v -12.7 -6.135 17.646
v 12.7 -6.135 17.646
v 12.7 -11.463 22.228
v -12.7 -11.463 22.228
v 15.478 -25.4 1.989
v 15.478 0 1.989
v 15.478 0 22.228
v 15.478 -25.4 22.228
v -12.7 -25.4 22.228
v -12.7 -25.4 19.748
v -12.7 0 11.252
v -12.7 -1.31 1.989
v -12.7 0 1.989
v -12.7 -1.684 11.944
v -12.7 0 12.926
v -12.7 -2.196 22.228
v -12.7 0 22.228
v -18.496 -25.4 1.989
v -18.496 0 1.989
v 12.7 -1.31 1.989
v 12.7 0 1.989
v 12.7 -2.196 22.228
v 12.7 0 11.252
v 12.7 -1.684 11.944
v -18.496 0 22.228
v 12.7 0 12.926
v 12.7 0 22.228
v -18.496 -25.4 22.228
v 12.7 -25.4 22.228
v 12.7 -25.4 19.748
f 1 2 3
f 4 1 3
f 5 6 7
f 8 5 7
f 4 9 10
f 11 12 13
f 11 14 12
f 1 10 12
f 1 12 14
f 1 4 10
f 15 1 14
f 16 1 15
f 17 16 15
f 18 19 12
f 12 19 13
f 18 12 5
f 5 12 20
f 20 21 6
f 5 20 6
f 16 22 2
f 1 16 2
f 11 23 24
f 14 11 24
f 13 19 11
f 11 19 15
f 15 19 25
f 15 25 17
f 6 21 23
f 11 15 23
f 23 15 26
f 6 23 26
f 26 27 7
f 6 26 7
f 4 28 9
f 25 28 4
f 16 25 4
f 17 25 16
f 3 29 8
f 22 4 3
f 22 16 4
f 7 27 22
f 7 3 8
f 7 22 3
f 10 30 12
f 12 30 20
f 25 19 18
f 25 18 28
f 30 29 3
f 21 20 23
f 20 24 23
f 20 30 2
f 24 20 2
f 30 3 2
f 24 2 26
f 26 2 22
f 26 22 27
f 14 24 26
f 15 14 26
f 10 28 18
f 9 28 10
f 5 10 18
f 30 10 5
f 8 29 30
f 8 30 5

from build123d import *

# Parameters (mm, degrees)
F0_W     = 33.974414
F0_H     = 20.238973
F1_DEPTH = 25.4
F3_DEPTH = 12.7


with BuildPart() as f1:
    # F0 (on Front) → F1 (new body)
    with BuildSketch(Plane.XZ):
        with Locations((-1.508936, 12.108095)):
            Rectangle(F0_W, F0_H)
    extrude(amount=F1_DEPTH)

    # F2 (on Right) → F3 (cut, symmetric)
    with BuildSketch(Plane.YZ):
        Polygon((-31.785678, 39.70434), (-39.439067, 30.098028), (11.018346, -7.099656), (15.880866, 4.716209), (-1.683568, 11.944407), (7.317314, 17.191587), (0.589001, 25.465947), (-6.135374, 17.646428), align=None)
    extrude(amount=F3_DEPTH, both=True, mode=Mode.SUBTRACT)


solid = f1.part
